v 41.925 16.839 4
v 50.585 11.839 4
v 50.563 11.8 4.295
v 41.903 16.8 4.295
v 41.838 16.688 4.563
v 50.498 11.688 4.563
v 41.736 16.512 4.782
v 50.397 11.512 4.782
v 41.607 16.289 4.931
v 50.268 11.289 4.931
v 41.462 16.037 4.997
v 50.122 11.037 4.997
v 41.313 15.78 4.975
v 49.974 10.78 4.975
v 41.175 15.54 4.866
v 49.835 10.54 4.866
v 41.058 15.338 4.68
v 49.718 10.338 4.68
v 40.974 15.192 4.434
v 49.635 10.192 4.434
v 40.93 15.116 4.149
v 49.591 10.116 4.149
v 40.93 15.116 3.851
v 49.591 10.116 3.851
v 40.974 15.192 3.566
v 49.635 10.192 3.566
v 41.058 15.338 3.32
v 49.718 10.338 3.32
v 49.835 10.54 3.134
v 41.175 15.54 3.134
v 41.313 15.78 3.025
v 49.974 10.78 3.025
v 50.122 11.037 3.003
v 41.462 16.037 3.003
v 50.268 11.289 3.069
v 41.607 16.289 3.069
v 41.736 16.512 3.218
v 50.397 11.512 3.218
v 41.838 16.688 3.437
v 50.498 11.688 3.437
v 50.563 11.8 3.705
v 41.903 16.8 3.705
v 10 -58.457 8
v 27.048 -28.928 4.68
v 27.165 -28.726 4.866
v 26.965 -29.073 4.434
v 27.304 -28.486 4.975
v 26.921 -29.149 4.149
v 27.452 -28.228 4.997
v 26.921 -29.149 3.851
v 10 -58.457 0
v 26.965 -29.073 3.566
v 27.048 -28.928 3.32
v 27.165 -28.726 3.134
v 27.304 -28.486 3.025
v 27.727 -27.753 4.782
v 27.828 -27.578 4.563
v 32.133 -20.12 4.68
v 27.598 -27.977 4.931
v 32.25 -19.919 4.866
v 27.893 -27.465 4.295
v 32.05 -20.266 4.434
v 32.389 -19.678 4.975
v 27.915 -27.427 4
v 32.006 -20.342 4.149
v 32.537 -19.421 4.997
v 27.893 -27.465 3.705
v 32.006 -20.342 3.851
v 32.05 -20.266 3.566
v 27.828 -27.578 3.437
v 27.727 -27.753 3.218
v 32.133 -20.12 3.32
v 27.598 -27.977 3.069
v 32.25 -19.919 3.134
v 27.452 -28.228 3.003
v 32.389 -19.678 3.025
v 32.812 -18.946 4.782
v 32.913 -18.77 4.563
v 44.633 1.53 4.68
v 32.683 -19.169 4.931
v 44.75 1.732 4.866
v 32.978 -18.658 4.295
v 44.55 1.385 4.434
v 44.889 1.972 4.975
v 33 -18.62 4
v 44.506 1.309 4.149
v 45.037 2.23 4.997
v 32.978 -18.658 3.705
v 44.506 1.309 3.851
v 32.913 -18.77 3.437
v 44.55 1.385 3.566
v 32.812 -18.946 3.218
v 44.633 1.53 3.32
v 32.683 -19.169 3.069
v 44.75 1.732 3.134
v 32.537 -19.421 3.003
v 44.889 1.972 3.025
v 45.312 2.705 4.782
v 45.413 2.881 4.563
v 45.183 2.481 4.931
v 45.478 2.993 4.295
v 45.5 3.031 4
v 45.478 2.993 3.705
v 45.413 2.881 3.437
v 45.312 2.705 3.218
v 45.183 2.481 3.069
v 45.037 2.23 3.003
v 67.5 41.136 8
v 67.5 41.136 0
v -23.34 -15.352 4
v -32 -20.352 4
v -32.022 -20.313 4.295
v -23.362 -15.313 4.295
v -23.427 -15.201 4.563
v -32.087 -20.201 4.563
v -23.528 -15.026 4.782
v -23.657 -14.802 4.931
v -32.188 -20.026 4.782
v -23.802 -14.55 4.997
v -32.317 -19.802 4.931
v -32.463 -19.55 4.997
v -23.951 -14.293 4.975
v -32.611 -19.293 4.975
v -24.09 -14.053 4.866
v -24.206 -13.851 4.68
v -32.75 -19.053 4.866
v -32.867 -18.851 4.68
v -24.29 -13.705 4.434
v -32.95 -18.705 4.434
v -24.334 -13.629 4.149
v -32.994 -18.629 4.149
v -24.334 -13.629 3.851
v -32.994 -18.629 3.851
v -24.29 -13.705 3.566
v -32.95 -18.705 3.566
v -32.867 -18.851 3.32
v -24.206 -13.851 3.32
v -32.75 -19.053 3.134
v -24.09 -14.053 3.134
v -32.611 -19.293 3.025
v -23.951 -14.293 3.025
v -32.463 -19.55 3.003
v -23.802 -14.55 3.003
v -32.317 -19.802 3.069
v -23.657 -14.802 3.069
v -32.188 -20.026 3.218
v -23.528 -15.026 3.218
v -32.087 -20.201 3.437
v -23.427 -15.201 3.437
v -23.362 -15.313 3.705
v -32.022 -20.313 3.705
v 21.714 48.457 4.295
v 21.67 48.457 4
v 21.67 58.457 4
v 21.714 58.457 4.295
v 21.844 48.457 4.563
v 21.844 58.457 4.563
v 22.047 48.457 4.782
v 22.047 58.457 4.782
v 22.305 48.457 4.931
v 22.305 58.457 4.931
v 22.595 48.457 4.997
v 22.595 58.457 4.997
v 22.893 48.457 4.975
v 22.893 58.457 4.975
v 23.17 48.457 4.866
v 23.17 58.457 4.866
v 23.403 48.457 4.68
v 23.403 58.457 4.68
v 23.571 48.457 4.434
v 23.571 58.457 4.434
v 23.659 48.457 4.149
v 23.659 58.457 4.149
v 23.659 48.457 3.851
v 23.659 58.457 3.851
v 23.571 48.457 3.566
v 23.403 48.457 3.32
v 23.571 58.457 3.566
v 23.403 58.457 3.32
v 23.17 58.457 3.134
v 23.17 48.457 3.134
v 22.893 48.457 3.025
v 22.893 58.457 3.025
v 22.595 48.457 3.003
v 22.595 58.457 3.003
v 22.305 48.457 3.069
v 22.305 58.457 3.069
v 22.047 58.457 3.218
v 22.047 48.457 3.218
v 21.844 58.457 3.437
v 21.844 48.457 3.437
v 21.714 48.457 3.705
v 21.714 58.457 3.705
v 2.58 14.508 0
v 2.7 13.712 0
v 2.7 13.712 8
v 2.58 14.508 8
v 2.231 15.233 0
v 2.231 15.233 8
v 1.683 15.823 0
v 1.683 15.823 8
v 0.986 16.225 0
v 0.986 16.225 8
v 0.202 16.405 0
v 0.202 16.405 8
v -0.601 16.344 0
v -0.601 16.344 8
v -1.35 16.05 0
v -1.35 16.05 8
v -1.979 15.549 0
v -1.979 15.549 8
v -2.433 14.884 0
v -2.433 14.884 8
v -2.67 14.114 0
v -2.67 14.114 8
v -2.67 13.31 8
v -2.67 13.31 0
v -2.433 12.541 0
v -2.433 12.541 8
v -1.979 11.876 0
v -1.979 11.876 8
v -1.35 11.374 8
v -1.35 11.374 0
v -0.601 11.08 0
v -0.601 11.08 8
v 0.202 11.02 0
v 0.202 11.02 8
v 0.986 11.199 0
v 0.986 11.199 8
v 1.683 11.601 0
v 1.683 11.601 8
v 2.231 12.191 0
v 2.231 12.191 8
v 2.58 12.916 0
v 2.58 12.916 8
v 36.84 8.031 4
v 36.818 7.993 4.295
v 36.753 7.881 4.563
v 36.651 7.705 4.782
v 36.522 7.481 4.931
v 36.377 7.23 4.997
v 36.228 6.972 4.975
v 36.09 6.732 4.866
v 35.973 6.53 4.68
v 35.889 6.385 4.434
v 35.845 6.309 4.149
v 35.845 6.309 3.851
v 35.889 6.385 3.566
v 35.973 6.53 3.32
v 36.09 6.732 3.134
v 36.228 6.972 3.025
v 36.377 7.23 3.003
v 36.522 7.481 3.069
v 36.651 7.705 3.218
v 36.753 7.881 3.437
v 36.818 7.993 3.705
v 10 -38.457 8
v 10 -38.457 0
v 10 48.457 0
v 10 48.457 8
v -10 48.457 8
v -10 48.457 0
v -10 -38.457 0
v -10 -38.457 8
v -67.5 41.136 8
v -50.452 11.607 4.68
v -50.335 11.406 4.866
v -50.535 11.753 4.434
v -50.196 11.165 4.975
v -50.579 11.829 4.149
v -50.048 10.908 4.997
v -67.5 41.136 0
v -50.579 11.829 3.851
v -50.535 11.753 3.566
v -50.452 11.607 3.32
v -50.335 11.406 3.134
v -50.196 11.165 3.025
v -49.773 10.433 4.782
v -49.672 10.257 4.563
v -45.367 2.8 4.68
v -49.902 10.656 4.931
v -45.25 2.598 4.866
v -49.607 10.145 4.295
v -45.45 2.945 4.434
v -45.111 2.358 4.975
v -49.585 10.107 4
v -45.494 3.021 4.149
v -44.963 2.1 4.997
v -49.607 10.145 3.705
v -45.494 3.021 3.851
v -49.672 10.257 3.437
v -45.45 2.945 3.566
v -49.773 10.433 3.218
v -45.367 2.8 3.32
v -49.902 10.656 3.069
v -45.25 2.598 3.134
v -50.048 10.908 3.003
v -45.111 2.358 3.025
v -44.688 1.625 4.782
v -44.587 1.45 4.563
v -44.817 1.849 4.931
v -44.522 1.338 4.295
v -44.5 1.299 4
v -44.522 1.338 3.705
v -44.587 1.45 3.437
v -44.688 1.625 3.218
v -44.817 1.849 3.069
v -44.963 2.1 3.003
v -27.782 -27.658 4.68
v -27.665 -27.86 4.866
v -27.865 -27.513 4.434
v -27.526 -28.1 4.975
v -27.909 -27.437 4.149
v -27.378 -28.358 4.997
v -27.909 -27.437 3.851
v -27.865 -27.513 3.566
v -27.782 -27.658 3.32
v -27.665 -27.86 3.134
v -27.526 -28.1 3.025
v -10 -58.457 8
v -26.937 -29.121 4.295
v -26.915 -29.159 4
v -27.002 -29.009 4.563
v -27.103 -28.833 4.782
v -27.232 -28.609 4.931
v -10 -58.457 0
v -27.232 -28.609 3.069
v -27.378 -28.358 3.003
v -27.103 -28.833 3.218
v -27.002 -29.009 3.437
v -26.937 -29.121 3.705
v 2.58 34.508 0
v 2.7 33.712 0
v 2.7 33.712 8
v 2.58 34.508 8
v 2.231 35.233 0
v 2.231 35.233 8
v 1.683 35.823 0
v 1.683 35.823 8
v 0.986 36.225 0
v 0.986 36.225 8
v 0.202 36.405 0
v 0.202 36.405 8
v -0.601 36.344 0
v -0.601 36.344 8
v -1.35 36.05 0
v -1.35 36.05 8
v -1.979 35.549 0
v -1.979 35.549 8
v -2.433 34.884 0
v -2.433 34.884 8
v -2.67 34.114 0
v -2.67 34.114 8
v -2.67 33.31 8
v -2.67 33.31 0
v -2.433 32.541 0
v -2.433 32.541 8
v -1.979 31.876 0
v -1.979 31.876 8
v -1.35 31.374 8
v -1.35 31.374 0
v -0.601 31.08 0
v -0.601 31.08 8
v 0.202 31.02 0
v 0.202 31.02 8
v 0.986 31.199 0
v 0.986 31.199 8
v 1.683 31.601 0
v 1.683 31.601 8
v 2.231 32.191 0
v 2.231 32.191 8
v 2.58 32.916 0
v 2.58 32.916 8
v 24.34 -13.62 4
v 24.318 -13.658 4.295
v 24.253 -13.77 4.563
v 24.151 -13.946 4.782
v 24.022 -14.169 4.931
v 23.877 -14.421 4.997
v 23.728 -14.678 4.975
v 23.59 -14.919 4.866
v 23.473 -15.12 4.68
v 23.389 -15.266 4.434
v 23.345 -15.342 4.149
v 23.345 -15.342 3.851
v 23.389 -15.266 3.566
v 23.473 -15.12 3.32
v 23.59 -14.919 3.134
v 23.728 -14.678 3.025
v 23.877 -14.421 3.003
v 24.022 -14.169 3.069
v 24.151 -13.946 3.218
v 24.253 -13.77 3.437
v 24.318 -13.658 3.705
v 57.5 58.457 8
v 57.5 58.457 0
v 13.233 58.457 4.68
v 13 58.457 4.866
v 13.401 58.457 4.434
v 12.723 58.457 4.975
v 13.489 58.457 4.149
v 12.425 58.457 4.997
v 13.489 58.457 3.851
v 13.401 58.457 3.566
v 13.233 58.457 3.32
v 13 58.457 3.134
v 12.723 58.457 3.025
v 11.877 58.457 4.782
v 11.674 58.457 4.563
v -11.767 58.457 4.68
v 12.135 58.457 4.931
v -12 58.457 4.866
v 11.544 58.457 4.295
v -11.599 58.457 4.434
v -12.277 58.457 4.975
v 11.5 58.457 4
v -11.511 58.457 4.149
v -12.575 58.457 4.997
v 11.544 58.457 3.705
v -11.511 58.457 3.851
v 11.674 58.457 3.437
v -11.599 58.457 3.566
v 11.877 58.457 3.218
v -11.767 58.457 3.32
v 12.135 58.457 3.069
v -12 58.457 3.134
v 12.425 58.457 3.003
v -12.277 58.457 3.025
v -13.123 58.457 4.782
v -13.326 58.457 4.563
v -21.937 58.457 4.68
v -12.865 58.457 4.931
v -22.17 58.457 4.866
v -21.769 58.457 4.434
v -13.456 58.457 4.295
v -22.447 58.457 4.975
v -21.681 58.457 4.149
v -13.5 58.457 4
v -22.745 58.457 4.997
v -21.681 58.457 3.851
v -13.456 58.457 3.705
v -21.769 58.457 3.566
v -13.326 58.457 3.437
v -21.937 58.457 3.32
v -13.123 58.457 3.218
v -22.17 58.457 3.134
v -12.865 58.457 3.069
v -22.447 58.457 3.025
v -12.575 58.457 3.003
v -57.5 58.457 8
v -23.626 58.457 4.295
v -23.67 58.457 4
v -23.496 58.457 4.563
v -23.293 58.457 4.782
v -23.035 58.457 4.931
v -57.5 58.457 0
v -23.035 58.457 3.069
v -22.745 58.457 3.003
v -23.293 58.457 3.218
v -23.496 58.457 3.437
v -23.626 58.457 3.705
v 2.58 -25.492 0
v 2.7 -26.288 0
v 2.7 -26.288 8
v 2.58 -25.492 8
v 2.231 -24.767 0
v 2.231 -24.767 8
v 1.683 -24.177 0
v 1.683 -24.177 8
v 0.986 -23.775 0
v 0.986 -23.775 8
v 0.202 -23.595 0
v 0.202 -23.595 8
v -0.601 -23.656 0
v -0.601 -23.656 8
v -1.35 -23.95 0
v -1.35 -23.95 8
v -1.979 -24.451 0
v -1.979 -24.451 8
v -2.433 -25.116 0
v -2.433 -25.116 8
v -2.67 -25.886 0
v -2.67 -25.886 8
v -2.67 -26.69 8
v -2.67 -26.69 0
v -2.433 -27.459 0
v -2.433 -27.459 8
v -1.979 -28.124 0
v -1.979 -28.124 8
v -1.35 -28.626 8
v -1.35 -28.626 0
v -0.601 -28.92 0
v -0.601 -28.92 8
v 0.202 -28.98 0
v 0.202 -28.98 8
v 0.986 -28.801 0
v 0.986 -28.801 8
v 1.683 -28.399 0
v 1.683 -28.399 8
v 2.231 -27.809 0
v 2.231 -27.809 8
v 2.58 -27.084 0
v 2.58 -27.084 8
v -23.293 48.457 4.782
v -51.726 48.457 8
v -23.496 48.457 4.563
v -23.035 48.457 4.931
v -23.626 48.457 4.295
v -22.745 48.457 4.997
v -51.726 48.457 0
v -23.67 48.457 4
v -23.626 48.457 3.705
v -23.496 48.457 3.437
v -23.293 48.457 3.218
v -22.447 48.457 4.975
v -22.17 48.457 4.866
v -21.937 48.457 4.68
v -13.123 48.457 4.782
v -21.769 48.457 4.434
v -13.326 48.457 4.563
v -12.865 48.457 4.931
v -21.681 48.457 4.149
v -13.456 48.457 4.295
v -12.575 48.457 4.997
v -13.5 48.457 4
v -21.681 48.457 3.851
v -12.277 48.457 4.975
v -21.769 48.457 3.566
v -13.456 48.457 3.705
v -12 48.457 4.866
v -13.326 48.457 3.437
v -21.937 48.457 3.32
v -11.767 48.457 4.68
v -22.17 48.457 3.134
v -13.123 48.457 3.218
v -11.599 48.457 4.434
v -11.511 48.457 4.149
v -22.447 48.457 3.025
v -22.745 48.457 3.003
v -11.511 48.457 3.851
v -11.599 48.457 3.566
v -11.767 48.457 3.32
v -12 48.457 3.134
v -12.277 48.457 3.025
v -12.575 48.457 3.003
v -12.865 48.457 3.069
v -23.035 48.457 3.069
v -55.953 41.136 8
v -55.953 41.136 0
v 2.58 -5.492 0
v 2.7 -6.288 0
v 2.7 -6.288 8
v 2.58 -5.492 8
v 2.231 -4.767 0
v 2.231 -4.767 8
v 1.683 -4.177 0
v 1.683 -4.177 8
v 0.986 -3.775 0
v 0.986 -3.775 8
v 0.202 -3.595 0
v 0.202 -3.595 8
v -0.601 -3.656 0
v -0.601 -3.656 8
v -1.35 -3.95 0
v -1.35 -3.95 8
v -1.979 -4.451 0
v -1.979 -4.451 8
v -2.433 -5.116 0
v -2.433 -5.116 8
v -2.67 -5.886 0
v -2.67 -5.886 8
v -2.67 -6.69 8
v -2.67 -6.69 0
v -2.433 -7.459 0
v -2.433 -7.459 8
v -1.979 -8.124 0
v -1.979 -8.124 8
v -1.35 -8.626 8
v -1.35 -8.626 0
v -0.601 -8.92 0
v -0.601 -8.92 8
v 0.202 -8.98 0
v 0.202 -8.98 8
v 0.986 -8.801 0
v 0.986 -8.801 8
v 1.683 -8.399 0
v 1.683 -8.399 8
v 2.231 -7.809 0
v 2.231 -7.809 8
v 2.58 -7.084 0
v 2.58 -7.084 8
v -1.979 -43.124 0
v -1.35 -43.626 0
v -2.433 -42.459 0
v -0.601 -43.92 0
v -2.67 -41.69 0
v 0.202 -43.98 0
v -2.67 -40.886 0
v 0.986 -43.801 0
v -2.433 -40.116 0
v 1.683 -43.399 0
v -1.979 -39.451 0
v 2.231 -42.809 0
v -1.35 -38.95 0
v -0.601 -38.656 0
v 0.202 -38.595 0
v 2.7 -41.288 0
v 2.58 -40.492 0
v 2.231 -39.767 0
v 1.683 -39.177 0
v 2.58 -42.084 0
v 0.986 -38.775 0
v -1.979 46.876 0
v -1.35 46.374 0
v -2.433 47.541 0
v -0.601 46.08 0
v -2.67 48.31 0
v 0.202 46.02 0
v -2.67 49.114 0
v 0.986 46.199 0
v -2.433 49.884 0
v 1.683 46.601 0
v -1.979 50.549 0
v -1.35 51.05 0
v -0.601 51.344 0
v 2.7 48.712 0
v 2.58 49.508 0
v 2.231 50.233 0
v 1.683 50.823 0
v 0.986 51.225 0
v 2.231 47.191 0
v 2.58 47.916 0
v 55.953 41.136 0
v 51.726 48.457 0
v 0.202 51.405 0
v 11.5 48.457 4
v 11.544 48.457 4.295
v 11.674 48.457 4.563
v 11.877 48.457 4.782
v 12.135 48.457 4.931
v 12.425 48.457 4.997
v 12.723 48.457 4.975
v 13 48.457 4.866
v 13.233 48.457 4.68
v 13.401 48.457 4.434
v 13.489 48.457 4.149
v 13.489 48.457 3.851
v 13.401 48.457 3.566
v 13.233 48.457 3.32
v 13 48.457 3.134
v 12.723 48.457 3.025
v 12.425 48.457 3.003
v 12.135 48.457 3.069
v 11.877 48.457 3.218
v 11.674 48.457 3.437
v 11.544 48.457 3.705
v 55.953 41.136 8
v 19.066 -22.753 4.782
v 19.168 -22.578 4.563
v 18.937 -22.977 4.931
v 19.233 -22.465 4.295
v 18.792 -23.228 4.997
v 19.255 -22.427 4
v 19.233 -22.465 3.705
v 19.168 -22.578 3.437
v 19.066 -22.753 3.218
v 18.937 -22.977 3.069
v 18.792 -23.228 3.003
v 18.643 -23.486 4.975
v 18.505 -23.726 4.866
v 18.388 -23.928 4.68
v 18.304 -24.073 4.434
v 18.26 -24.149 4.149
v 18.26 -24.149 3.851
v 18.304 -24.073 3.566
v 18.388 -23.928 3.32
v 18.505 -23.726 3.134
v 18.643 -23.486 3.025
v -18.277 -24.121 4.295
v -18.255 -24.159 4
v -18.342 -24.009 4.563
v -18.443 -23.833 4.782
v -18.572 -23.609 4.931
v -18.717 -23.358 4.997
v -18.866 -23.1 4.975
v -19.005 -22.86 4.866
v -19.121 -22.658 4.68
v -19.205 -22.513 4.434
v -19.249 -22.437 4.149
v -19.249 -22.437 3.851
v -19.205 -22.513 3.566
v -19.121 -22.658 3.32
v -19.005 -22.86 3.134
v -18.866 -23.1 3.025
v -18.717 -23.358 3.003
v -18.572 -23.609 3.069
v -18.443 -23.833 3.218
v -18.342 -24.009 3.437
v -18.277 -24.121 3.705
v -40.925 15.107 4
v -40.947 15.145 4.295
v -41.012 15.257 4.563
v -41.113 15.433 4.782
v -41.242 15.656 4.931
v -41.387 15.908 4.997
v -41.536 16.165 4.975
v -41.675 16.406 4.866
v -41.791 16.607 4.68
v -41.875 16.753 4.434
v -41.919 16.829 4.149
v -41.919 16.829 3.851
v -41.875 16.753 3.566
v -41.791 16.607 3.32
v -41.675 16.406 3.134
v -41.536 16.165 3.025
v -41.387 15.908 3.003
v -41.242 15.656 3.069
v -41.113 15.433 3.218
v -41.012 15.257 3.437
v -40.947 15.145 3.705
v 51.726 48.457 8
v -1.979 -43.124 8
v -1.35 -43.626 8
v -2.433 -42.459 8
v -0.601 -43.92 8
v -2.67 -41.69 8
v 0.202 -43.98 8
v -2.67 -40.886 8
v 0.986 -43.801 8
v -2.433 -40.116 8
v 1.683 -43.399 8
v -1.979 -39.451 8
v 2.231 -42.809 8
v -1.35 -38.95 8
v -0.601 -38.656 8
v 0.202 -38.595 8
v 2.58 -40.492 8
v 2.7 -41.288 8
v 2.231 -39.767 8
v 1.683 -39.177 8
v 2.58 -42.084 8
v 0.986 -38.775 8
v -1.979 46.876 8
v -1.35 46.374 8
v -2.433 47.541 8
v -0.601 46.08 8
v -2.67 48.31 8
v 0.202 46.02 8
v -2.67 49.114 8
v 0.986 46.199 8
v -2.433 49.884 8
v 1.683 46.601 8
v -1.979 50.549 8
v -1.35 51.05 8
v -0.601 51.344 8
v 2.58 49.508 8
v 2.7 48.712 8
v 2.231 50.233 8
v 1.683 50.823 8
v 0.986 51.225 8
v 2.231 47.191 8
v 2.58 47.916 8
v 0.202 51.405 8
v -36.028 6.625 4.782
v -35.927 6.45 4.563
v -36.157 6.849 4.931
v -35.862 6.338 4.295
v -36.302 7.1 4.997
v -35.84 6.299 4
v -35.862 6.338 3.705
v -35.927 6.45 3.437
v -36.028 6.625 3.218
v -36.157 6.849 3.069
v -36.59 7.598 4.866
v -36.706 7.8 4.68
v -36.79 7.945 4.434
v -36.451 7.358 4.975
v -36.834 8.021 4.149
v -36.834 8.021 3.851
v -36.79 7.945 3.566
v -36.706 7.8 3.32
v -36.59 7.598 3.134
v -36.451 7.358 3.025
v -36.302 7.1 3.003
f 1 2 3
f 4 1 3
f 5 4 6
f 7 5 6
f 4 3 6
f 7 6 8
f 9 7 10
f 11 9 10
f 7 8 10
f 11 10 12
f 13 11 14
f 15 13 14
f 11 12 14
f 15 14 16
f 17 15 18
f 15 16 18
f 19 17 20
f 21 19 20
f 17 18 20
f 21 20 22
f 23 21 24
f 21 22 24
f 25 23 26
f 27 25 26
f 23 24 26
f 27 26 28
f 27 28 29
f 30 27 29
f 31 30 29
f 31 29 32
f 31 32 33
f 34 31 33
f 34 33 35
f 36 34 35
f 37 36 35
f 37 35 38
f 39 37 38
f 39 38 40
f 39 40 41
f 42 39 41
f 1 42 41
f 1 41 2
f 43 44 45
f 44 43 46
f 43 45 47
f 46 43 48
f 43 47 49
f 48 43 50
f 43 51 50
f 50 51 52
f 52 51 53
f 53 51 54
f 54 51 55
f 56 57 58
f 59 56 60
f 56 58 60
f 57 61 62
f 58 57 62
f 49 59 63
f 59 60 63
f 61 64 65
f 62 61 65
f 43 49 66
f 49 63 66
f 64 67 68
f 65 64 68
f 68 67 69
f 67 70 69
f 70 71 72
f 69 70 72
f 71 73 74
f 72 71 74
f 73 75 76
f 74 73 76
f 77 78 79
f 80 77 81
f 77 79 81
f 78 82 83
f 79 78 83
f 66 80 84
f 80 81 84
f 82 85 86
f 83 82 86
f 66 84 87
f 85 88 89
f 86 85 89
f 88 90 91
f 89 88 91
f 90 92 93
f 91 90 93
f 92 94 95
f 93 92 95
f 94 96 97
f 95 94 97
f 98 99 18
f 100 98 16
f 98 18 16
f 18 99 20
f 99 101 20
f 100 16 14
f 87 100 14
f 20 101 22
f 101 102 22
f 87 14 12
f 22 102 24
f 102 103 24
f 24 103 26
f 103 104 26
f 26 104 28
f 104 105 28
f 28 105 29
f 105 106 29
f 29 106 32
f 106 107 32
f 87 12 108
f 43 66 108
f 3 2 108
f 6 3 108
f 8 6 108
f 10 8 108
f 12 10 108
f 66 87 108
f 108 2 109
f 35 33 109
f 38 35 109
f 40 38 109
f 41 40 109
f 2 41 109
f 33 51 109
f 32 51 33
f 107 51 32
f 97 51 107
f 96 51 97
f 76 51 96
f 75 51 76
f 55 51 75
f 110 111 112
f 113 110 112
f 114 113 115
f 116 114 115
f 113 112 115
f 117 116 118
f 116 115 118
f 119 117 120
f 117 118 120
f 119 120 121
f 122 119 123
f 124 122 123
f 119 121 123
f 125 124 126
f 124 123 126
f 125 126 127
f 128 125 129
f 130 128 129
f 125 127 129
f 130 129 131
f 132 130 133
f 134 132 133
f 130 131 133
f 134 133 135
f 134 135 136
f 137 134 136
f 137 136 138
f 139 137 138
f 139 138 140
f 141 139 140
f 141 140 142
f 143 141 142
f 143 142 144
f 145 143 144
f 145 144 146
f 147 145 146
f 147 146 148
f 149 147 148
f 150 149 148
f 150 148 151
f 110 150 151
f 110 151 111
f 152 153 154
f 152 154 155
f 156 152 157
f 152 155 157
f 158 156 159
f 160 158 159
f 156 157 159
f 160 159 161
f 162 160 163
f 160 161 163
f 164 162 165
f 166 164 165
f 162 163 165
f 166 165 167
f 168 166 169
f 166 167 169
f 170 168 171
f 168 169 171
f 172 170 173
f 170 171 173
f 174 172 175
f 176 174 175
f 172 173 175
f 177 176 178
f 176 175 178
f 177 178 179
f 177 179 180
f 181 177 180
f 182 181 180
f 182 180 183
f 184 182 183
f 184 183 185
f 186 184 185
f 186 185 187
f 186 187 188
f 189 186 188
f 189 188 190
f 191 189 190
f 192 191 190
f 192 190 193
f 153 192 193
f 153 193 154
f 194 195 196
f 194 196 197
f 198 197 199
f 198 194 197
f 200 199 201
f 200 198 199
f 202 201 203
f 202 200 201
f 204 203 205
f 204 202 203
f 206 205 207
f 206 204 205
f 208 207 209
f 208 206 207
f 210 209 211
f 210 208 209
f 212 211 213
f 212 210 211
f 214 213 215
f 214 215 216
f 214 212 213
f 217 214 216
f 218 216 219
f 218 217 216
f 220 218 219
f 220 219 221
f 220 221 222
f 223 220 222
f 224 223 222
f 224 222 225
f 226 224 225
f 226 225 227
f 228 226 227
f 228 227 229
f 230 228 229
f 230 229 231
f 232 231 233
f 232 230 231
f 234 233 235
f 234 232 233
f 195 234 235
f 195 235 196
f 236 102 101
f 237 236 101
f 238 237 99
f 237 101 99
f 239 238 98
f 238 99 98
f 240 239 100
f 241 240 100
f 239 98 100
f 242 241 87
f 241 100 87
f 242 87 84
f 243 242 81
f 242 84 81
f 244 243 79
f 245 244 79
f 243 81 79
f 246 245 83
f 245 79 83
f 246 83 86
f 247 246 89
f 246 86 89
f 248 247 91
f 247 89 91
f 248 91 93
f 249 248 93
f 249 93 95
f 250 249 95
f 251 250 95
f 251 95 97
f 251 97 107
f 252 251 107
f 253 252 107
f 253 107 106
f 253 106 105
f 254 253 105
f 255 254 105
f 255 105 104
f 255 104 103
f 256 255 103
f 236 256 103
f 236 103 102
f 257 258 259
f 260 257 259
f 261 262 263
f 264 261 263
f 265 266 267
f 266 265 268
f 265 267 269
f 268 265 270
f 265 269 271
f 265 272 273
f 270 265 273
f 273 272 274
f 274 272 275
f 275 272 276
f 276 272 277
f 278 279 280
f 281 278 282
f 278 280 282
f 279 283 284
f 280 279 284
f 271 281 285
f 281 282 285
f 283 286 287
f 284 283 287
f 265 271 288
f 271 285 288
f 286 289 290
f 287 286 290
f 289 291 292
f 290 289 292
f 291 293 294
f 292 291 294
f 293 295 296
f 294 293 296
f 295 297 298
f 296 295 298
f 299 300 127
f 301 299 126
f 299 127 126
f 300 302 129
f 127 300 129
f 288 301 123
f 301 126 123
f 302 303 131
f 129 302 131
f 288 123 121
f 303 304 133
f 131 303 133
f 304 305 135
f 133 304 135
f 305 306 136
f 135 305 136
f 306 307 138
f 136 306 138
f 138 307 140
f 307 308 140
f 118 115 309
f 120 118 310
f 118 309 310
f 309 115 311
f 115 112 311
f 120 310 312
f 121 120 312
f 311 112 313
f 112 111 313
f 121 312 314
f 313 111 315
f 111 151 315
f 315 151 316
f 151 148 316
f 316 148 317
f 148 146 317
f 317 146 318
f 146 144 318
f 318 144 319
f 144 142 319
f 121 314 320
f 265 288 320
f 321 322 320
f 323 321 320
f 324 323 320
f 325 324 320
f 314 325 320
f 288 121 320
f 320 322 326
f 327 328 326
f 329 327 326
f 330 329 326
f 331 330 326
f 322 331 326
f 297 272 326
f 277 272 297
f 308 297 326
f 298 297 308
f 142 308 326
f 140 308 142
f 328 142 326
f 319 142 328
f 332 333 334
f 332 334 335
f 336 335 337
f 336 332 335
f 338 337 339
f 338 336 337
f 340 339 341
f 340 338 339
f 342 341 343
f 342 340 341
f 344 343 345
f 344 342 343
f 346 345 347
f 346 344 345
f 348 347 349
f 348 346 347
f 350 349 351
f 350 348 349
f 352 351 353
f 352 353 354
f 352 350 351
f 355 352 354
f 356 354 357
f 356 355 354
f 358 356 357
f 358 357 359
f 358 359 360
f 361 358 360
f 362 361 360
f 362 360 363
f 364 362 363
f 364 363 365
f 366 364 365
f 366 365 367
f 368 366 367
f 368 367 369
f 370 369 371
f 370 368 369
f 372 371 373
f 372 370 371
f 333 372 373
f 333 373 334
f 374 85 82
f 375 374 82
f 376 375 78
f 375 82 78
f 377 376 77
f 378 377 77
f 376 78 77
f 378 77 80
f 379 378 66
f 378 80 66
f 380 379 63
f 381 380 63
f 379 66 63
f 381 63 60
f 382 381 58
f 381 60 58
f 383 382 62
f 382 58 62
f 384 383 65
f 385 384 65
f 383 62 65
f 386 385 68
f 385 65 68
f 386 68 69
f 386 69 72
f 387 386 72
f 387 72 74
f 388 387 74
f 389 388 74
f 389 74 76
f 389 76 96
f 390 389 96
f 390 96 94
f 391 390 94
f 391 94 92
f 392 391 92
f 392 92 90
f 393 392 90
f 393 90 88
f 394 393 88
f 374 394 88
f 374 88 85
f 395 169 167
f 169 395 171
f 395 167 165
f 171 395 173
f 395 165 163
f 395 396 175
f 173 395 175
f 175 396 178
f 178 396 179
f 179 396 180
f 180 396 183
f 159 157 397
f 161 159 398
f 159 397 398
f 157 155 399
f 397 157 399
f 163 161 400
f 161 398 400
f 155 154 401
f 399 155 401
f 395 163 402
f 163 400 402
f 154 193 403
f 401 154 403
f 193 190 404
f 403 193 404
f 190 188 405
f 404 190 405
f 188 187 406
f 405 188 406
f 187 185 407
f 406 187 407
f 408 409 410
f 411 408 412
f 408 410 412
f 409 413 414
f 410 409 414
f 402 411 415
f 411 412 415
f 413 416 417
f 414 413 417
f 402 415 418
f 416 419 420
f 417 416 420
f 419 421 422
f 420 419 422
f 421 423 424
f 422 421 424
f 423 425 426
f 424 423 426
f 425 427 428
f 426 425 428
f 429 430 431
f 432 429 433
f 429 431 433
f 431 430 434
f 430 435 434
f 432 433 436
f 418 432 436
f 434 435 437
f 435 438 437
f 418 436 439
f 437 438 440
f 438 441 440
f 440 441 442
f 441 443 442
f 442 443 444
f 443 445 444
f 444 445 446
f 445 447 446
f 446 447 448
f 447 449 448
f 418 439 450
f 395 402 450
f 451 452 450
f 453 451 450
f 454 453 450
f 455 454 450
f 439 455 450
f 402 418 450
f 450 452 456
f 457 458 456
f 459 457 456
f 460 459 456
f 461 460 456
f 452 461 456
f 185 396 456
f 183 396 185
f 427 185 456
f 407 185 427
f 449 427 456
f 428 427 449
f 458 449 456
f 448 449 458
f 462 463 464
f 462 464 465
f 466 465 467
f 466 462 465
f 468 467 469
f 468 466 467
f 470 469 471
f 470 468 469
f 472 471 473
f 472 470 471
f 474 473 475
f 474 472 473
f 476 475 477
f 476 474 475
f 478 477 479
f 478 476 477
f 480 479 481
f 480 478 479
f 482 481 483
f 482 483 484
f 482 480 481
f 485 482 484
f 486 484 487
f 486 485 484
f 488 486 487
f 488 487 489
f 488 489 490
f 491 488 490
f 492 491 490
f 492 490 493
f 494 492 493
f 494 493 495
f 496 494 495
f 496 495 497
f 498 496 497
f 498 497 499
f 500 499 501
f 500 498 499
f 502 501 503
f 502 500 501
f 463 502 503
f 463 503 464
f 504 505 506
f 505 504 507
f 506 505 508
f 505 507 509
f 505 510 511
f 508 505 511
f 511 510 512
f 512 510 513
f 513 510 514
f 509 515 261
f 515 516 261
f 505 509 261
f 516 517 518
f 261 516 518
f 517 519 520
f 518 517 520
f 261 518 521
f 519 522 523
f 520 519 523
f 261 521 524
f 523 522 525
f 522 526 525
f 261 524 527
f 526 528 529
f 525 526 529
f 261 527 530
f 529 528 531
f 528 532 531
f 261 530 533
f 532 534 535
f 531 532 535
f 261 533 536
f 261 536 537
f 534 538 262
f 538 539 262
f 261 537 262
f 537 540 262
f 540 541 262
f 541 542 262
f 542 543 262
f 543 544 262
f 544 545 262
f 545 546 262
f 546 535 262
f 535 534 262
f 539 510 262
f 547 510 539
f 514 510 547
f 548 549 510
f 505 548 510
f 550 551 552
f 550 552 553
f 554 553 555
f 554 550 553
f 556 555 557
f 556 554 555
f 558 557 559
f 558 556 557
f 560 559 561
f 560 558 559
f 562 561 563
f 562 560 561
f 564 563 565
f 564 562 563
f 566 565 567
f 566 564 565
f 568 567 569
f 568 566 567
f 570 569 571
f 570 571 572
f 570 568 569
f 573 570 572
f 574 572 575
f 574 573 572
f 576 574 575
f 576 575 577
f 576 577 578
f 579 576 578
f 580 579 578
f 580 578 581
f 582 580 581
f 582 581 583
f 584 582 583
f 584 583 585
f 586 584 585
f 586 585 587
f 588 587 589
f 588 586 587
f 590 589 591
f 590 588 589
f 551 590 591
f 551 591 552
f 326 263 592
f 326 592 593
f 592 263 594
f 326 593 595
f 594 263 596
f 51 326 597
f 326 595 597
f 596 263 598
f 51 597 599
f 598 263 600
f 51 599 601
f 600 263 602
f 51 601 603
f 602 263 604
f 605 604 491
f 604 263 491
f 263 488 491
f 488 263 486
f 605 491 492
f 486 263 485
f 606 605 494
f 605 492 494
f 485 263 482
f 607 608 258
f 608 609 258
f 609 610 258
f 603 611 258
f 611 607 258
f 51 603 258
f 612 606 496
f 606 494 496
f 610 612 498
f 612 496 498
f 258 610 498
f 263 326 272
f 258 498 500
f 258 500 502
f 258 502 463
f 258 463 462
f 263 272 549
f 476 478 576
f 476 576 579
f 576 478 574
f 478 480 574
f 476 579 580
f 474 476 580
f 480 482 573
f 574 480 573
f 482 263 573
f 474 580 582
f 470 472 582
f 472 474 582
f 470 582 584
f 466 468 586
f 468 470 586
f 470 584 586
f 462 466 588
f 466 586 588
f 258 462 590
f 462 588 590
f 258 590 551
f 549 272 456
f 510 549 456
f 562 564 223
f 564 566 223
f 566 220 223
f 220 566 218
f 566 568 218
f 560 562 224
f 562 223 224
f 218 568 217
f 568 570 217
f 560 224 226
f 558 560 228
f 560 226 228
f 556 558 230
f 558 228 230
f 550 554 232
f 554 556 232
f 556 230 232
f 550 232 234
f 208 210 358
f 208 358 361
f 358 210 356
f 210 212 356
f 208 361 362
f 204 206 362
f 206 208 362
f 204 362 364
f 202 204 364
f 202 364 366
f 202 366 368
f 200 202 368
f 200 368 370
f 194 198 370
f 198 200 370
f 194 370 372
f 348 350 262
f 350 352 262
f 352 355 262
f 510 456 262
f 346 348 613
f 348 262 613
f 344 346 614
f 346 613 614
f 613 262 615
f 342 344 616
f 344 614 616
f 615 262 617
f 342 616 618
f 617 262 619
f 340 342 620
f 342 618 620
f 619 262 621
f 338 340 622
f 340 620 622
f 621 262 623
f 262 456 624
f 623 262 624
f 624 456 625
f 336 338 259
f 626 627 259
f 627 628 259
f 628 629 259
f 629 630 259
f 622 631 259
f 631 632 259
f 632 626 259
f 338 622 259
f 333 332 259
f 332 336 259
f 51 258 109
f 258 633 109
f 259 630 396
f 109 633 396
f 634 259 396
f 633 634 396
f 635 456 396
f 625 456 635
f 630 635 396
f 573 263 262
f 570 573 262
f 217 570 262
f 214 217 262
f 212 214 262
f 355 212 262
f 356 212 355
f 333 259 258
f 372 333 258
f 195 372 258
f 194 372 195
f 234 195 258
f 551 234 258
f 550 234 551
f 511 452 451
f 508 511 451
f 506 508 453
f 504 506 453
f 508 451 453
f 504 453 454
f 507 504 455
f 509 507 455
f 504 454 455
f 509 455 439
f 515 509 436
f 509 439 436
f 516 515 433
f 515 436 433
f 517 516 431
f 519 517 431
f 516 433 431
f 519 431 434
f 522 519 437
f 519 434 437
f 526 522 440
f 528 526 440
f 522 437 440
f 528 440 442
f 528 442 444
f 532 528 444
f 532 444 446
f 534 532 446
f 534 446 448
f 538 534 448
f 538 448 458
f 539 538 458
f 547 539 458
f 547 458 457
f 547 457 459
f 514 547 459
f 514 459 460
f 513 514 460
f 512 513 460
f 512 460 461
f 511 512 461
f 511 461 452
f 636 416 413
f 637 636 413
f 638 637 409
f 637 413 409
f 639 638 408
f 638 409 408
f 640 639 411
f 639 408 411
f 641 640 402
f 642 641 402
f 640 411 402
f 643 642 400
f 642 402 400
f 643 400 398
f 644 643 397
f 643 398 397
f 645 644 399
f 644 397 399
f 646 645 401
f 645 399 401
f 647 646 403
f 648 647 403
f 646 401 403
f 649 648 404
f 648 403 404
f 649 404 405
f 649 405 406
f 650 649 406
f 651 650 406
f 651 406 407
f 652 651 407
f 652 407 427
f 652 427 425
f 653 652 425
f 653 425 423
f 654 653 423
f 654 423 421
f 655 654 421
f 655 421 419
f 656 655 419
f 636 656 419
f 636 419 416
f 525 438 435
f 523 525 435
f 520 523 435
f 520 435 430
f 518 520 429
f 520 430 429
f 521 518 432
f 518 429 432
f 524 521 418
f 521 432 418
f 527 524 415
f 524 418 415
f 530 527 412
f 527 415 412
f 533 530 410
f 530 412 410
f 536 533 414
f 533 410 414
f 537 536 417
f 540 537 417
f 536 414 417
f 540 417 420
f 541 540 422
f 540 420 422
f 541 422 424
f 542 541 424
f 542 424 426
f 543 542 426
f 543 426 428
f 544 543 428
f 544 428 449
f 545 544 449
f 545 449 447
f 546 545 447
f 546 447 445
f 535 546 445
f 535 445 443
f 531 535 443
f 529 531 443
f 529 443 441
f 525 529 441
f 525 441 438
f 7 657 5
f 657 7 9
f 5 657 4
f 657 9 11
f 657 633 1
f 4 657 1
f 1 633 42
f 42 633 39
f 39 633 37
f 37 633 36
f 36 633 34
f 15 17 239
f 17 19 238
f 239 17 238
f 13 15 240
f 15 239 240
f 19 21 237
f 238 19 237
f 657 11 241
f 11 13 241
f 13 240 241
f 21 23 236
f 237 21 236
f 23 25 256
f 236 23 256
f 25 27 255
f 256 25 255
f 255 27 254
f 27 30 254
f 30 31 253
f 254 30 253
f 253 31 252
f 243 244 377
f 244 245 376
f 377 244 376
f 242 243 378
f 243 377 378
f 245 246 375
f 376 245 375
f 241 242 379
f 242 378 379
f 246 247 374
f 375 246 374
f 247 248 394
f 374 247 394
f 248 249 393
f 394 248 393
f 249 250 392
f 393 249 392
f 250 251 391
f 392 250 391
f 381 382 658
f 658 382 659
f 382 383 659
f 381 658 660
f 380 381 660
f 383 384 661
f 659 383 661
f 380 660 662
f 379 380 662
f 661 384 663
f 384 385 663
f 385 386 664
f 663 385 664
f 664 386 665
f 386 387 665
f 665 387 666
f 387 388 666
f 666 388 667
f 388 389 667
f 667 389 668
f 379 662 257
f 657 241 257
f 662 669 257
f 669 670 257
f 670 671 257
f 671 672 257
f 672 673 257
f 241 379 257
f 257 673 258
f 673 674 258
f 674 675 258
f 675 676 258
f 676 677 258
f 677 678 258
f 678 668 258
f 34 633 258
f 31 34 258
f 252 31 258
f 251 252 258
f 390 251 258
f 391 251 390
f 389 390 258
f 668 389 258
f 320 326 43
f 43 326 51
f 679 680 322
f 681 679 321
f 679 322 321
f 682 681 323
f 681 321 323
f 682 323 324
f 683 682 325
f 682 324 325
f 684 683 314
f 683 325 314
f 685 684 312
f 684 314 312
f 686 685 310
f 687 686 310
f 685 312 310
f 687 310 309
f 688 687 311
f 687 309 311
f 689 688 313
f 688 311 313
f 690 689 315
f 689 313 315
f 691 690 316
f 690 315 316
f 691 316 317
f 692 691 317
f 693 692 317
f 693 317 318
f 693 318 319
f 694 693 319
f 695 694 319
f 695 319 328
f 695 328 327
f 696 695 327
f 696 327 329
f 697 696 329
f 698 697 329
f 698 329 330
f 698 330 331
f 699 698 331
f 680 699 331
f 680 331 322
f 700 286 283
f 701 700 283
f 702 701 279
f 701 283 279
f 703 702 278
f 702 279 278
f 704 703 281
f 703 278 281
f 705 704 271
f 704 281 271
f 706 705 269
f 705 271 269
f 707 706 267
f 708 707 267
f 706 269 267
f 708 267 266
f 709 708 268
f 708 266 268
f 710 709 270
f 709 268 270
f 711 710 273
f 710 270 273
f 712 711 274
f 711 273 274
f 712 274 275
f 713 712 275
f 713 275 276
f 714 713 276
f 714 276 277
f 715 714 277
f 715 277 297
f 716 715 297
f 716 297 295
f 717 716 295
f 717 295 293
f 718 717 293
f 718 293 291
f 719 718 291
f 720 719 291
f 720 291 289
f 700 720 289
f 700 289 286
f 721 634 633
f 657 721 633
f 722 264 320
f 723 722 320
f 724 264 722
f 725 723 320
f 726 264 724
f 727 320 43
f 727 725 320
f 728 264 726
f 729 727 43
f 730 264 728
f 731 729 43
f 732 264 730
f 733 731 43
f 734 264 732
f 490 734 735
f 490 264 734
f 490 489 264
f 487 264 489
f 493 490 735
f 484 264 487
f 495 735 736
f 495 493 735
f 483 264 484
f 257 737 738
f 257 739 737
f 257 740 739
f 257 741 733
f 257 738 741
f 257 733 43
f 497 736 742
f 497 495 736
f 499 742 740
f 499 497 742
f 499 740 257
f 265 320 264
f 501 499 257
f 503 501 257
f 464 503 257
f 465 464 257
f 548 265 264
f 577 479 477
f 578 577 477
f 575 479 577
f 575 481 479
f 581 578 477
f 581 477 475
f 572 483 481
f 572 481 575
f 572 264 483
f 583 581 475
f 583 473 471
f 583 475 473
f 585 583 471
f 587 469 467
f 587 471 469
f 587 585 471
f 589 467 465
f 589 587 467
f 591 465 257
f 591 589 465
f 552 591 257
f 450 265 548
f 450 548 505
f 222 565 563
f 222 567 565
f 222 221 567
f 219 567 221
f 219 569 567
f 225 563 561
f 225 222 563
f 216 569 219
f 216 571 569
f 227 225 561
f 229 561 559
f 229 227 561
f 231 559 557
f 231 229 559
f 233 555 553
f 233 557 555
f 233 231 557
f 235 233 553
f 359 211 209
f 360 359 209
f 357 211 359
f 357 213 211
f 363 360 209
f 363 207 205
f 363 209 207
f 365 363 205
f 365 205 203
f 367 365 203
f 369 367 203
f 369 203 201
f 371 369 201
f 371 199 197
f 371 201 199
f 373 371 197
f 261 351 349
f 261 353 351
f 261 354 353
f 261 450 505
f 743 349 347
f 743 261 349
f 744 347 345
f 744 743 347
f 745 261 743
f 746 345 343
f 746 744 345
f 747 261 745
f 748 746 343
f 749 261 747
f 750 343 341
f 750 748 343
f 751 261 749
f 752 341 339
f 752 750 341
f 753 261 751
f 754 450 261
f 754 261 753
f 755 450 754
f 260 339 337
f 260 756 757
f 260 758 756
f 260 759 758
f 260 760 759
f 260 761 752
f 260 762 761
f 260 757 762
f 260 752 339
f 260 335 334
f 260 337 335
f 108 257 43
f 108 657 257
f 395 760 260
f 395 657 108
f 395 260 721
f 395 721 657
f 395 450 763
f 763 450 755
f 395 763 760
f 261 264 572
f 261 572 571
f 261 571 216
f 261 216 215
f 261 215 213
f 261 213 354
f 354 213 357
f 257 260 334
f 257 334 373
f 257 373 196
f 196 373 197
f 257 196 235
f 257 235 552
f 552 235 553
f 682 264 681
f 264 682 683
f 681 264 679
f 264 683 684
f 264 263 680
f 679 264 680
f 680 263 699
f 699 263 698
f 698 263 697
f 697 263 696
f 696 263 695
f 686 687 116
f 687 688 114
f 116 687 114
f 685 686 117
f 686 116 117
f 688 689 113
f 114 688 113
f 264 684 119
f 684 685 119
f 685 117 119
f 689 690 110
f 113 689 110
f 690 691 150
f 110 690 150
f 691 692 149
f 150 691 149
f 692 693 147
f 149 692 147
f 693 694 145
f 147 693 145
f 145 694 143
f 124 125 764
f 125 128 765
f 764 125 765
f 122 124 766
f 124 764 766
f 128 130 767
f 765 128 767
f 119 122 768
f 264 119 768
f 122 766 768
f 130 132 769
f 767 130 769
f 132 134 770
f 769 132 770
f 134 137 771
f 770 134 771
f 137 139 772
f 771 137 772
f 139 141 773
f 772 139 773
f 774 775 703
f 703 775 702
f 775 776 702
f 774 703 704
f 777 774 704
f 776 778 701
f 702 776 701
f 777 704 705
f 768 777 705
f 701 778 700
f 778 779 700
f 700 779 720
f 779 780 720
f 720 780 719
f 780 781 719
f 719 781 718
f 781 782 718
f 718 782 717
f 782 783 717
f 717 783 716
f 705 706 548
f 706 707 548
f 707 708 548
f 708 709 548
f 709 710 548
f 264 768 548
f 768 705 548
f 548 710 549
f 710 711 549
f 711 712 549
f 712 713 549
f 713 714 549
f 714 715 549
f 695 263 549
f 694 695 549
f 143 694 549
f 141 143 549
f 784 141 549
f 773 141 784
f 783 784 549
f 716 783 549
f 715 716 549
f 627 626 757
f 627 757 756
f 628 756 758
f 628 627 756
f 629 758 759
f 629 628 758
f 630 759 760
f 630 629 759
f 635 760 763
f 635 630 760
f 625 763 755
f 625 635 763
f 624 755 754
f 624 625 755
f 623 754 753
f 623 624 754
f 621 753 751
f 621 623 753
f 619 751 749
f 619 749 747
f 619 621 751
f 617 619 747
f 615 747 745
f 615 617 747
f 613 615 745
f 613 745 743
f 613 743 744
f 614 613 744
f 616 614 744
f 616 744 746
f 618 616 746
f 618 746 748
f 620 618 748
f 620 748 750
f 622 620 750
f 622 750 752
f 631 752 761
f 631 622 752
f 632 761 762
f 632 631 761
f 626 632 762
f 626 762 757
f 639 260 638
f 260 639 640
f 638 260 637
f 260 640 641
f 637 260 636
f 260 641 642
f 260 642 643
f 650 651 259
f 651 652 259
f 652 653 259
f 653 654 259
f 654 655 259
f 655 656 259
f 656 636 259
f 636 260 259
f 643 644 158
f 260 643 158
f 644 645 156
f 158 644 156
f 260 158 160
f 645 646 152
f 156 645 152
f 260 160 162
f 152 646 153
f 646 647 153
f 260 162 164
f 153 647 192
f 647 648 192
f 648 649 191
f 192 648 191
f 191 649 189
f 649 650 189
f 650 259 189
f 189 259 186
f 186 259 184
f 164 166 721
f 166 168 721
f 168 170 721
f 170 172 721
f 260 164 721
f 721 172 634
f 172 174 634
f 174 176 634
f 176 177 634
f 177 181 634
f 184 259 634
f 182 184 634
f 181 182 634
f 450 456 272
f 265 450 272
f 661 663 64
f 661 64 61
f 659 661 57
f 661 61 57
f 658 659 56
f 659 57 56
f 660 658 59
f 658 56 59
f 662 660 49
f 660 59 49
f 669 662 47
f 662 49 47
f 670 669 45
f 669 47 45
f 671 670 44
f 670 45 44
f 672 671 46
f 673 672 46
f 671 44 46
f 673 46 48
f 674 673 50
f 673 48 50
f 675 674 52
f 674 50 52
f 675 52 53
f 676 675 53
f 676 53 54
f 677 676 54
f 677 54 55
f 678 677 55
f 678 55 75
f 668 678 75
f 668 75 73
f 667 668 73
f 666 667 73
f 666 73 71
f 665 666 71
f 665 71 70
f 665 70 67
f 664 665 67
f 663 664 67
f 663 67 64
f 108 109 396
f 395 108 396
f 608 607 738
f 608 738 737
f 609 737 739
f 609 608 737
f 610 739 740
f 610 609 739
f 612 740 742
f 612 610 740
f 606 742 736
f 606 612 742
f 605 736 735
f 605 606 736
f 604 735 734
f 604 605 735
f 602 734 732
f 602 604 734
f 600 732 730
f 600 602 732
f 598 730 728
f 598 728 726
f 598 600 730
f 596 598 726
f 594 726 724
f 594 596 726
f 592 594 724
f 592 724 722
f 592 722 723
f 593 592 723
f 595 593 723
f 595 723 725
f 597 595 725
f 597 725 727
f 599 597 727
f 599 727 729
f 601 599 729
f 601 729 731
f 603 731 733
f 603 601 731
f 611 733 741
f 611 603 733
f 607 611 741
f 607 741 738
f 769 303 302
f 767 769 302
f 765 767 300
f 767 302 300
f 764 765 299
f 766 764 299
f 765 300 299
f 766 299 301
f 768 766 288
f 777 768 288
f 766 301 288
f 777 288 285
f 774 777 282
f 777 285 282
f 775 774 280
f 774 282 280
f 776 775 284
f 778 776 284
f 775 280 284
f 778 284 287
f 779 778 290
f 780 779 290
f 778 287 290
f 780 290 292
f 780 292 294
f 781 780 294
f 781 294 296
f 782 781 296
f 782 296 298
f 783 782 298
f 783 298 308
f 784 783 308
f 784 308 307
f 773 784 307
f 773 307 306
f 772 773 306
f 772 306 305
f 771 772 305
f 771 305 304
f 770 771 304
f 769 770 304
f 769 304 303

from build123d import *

# Parameters (mm, degrees)
F0_R            = 2.7
F1_DEPTH        = 8
F2_R            = 1
F3_DEPTH        = 11
F3_COPIES_COUNT = 3


# Not quite as in the source:
# - a pattern or mirror of a feature is missing from the dataset's text; its kind, count and spacing are read off the source's solid


with BuildPart() as f1:
    # F0 (on Top) → F1 (new body)
    with BuildSketch(Plane.XY):
        Polygon((57.5, 58.4567147554), (-57.5, 58.4567147554), (-67.5, 41.1362066798), (-10, -58.4567147554), (10, -58.4567147554), (67.5, 41.1362066798), align=None)
        with Locations((0, -41.2879311067)):
            Circle(F0_R, mode=Mode.SUBTRACT)
        with Locations((0, -26.2879311067)):
            Circle(F0_R, mode=Mode.SUBTRACT)
        with Locations((0, -6.2879311067)):
            Circle(F0_R, mode=Mode.SUBTRACT)
        Polygon((-10, 48.4567147554), (-10, -38.4567147554), (-55.9529946162, 41.1362066798), (-51.7264973081, 48.4567147554), align=None, mode=Mode.SUBTRACT)
        with Locations((0, 13.7120688933)):
            Circle(F0_R, mode=Mode.SUBTRACT)
        Polygon((51.7264973081, 48.4567147554), (55.9529946162, 41.1362066798), (10, -38.4567147554), (10, 48.4567147554), align=None, mode=Mode.SUBTRACT)
        with Locations((0, 33.7120688933)):
            Circle(F0_R, mode=Mode.SUBTRACT)
        with Locations((0, 48.7120688933)):
            Circle(F0_R, mode=Mode.SUBTRACT)
    extrude(amount=F1_DEPTH)

    # F2 (on face) → F3 (cut)
    with BuildSketch(Plane(origin=(32.8125, -18.9443057078, 0), x_dir=(0.5, 0.8660254038, 0), z_dir=(0.8660254038, -0.5, 0))):
        with Locations((-10.795, 4)):
            Circle(F2_R)
        with Locations((-0.625, 4)):
            Circle(F2_R)
        with Locations((34.545, 4)):
            Circle(F2_R)
        with Locations((24.375, 4)):
            Circle(F2_R)
    f3 = extrude(amount=-F3_DEPTH, mode=Mode.SUBTRACT)

    # F3_copies: F3 ×3 about axis
    f3_copies_axis = Axis((0, 13.712069, 0), (0, 0, 1))
    for i in range(1, F3_COPIES_COUNT):
        add(f3.rotate(f3_copies_axis, i * 360 / F3_COPIES_COUNT), mode=Mode.SUBTRACT)


solid = f1.part
